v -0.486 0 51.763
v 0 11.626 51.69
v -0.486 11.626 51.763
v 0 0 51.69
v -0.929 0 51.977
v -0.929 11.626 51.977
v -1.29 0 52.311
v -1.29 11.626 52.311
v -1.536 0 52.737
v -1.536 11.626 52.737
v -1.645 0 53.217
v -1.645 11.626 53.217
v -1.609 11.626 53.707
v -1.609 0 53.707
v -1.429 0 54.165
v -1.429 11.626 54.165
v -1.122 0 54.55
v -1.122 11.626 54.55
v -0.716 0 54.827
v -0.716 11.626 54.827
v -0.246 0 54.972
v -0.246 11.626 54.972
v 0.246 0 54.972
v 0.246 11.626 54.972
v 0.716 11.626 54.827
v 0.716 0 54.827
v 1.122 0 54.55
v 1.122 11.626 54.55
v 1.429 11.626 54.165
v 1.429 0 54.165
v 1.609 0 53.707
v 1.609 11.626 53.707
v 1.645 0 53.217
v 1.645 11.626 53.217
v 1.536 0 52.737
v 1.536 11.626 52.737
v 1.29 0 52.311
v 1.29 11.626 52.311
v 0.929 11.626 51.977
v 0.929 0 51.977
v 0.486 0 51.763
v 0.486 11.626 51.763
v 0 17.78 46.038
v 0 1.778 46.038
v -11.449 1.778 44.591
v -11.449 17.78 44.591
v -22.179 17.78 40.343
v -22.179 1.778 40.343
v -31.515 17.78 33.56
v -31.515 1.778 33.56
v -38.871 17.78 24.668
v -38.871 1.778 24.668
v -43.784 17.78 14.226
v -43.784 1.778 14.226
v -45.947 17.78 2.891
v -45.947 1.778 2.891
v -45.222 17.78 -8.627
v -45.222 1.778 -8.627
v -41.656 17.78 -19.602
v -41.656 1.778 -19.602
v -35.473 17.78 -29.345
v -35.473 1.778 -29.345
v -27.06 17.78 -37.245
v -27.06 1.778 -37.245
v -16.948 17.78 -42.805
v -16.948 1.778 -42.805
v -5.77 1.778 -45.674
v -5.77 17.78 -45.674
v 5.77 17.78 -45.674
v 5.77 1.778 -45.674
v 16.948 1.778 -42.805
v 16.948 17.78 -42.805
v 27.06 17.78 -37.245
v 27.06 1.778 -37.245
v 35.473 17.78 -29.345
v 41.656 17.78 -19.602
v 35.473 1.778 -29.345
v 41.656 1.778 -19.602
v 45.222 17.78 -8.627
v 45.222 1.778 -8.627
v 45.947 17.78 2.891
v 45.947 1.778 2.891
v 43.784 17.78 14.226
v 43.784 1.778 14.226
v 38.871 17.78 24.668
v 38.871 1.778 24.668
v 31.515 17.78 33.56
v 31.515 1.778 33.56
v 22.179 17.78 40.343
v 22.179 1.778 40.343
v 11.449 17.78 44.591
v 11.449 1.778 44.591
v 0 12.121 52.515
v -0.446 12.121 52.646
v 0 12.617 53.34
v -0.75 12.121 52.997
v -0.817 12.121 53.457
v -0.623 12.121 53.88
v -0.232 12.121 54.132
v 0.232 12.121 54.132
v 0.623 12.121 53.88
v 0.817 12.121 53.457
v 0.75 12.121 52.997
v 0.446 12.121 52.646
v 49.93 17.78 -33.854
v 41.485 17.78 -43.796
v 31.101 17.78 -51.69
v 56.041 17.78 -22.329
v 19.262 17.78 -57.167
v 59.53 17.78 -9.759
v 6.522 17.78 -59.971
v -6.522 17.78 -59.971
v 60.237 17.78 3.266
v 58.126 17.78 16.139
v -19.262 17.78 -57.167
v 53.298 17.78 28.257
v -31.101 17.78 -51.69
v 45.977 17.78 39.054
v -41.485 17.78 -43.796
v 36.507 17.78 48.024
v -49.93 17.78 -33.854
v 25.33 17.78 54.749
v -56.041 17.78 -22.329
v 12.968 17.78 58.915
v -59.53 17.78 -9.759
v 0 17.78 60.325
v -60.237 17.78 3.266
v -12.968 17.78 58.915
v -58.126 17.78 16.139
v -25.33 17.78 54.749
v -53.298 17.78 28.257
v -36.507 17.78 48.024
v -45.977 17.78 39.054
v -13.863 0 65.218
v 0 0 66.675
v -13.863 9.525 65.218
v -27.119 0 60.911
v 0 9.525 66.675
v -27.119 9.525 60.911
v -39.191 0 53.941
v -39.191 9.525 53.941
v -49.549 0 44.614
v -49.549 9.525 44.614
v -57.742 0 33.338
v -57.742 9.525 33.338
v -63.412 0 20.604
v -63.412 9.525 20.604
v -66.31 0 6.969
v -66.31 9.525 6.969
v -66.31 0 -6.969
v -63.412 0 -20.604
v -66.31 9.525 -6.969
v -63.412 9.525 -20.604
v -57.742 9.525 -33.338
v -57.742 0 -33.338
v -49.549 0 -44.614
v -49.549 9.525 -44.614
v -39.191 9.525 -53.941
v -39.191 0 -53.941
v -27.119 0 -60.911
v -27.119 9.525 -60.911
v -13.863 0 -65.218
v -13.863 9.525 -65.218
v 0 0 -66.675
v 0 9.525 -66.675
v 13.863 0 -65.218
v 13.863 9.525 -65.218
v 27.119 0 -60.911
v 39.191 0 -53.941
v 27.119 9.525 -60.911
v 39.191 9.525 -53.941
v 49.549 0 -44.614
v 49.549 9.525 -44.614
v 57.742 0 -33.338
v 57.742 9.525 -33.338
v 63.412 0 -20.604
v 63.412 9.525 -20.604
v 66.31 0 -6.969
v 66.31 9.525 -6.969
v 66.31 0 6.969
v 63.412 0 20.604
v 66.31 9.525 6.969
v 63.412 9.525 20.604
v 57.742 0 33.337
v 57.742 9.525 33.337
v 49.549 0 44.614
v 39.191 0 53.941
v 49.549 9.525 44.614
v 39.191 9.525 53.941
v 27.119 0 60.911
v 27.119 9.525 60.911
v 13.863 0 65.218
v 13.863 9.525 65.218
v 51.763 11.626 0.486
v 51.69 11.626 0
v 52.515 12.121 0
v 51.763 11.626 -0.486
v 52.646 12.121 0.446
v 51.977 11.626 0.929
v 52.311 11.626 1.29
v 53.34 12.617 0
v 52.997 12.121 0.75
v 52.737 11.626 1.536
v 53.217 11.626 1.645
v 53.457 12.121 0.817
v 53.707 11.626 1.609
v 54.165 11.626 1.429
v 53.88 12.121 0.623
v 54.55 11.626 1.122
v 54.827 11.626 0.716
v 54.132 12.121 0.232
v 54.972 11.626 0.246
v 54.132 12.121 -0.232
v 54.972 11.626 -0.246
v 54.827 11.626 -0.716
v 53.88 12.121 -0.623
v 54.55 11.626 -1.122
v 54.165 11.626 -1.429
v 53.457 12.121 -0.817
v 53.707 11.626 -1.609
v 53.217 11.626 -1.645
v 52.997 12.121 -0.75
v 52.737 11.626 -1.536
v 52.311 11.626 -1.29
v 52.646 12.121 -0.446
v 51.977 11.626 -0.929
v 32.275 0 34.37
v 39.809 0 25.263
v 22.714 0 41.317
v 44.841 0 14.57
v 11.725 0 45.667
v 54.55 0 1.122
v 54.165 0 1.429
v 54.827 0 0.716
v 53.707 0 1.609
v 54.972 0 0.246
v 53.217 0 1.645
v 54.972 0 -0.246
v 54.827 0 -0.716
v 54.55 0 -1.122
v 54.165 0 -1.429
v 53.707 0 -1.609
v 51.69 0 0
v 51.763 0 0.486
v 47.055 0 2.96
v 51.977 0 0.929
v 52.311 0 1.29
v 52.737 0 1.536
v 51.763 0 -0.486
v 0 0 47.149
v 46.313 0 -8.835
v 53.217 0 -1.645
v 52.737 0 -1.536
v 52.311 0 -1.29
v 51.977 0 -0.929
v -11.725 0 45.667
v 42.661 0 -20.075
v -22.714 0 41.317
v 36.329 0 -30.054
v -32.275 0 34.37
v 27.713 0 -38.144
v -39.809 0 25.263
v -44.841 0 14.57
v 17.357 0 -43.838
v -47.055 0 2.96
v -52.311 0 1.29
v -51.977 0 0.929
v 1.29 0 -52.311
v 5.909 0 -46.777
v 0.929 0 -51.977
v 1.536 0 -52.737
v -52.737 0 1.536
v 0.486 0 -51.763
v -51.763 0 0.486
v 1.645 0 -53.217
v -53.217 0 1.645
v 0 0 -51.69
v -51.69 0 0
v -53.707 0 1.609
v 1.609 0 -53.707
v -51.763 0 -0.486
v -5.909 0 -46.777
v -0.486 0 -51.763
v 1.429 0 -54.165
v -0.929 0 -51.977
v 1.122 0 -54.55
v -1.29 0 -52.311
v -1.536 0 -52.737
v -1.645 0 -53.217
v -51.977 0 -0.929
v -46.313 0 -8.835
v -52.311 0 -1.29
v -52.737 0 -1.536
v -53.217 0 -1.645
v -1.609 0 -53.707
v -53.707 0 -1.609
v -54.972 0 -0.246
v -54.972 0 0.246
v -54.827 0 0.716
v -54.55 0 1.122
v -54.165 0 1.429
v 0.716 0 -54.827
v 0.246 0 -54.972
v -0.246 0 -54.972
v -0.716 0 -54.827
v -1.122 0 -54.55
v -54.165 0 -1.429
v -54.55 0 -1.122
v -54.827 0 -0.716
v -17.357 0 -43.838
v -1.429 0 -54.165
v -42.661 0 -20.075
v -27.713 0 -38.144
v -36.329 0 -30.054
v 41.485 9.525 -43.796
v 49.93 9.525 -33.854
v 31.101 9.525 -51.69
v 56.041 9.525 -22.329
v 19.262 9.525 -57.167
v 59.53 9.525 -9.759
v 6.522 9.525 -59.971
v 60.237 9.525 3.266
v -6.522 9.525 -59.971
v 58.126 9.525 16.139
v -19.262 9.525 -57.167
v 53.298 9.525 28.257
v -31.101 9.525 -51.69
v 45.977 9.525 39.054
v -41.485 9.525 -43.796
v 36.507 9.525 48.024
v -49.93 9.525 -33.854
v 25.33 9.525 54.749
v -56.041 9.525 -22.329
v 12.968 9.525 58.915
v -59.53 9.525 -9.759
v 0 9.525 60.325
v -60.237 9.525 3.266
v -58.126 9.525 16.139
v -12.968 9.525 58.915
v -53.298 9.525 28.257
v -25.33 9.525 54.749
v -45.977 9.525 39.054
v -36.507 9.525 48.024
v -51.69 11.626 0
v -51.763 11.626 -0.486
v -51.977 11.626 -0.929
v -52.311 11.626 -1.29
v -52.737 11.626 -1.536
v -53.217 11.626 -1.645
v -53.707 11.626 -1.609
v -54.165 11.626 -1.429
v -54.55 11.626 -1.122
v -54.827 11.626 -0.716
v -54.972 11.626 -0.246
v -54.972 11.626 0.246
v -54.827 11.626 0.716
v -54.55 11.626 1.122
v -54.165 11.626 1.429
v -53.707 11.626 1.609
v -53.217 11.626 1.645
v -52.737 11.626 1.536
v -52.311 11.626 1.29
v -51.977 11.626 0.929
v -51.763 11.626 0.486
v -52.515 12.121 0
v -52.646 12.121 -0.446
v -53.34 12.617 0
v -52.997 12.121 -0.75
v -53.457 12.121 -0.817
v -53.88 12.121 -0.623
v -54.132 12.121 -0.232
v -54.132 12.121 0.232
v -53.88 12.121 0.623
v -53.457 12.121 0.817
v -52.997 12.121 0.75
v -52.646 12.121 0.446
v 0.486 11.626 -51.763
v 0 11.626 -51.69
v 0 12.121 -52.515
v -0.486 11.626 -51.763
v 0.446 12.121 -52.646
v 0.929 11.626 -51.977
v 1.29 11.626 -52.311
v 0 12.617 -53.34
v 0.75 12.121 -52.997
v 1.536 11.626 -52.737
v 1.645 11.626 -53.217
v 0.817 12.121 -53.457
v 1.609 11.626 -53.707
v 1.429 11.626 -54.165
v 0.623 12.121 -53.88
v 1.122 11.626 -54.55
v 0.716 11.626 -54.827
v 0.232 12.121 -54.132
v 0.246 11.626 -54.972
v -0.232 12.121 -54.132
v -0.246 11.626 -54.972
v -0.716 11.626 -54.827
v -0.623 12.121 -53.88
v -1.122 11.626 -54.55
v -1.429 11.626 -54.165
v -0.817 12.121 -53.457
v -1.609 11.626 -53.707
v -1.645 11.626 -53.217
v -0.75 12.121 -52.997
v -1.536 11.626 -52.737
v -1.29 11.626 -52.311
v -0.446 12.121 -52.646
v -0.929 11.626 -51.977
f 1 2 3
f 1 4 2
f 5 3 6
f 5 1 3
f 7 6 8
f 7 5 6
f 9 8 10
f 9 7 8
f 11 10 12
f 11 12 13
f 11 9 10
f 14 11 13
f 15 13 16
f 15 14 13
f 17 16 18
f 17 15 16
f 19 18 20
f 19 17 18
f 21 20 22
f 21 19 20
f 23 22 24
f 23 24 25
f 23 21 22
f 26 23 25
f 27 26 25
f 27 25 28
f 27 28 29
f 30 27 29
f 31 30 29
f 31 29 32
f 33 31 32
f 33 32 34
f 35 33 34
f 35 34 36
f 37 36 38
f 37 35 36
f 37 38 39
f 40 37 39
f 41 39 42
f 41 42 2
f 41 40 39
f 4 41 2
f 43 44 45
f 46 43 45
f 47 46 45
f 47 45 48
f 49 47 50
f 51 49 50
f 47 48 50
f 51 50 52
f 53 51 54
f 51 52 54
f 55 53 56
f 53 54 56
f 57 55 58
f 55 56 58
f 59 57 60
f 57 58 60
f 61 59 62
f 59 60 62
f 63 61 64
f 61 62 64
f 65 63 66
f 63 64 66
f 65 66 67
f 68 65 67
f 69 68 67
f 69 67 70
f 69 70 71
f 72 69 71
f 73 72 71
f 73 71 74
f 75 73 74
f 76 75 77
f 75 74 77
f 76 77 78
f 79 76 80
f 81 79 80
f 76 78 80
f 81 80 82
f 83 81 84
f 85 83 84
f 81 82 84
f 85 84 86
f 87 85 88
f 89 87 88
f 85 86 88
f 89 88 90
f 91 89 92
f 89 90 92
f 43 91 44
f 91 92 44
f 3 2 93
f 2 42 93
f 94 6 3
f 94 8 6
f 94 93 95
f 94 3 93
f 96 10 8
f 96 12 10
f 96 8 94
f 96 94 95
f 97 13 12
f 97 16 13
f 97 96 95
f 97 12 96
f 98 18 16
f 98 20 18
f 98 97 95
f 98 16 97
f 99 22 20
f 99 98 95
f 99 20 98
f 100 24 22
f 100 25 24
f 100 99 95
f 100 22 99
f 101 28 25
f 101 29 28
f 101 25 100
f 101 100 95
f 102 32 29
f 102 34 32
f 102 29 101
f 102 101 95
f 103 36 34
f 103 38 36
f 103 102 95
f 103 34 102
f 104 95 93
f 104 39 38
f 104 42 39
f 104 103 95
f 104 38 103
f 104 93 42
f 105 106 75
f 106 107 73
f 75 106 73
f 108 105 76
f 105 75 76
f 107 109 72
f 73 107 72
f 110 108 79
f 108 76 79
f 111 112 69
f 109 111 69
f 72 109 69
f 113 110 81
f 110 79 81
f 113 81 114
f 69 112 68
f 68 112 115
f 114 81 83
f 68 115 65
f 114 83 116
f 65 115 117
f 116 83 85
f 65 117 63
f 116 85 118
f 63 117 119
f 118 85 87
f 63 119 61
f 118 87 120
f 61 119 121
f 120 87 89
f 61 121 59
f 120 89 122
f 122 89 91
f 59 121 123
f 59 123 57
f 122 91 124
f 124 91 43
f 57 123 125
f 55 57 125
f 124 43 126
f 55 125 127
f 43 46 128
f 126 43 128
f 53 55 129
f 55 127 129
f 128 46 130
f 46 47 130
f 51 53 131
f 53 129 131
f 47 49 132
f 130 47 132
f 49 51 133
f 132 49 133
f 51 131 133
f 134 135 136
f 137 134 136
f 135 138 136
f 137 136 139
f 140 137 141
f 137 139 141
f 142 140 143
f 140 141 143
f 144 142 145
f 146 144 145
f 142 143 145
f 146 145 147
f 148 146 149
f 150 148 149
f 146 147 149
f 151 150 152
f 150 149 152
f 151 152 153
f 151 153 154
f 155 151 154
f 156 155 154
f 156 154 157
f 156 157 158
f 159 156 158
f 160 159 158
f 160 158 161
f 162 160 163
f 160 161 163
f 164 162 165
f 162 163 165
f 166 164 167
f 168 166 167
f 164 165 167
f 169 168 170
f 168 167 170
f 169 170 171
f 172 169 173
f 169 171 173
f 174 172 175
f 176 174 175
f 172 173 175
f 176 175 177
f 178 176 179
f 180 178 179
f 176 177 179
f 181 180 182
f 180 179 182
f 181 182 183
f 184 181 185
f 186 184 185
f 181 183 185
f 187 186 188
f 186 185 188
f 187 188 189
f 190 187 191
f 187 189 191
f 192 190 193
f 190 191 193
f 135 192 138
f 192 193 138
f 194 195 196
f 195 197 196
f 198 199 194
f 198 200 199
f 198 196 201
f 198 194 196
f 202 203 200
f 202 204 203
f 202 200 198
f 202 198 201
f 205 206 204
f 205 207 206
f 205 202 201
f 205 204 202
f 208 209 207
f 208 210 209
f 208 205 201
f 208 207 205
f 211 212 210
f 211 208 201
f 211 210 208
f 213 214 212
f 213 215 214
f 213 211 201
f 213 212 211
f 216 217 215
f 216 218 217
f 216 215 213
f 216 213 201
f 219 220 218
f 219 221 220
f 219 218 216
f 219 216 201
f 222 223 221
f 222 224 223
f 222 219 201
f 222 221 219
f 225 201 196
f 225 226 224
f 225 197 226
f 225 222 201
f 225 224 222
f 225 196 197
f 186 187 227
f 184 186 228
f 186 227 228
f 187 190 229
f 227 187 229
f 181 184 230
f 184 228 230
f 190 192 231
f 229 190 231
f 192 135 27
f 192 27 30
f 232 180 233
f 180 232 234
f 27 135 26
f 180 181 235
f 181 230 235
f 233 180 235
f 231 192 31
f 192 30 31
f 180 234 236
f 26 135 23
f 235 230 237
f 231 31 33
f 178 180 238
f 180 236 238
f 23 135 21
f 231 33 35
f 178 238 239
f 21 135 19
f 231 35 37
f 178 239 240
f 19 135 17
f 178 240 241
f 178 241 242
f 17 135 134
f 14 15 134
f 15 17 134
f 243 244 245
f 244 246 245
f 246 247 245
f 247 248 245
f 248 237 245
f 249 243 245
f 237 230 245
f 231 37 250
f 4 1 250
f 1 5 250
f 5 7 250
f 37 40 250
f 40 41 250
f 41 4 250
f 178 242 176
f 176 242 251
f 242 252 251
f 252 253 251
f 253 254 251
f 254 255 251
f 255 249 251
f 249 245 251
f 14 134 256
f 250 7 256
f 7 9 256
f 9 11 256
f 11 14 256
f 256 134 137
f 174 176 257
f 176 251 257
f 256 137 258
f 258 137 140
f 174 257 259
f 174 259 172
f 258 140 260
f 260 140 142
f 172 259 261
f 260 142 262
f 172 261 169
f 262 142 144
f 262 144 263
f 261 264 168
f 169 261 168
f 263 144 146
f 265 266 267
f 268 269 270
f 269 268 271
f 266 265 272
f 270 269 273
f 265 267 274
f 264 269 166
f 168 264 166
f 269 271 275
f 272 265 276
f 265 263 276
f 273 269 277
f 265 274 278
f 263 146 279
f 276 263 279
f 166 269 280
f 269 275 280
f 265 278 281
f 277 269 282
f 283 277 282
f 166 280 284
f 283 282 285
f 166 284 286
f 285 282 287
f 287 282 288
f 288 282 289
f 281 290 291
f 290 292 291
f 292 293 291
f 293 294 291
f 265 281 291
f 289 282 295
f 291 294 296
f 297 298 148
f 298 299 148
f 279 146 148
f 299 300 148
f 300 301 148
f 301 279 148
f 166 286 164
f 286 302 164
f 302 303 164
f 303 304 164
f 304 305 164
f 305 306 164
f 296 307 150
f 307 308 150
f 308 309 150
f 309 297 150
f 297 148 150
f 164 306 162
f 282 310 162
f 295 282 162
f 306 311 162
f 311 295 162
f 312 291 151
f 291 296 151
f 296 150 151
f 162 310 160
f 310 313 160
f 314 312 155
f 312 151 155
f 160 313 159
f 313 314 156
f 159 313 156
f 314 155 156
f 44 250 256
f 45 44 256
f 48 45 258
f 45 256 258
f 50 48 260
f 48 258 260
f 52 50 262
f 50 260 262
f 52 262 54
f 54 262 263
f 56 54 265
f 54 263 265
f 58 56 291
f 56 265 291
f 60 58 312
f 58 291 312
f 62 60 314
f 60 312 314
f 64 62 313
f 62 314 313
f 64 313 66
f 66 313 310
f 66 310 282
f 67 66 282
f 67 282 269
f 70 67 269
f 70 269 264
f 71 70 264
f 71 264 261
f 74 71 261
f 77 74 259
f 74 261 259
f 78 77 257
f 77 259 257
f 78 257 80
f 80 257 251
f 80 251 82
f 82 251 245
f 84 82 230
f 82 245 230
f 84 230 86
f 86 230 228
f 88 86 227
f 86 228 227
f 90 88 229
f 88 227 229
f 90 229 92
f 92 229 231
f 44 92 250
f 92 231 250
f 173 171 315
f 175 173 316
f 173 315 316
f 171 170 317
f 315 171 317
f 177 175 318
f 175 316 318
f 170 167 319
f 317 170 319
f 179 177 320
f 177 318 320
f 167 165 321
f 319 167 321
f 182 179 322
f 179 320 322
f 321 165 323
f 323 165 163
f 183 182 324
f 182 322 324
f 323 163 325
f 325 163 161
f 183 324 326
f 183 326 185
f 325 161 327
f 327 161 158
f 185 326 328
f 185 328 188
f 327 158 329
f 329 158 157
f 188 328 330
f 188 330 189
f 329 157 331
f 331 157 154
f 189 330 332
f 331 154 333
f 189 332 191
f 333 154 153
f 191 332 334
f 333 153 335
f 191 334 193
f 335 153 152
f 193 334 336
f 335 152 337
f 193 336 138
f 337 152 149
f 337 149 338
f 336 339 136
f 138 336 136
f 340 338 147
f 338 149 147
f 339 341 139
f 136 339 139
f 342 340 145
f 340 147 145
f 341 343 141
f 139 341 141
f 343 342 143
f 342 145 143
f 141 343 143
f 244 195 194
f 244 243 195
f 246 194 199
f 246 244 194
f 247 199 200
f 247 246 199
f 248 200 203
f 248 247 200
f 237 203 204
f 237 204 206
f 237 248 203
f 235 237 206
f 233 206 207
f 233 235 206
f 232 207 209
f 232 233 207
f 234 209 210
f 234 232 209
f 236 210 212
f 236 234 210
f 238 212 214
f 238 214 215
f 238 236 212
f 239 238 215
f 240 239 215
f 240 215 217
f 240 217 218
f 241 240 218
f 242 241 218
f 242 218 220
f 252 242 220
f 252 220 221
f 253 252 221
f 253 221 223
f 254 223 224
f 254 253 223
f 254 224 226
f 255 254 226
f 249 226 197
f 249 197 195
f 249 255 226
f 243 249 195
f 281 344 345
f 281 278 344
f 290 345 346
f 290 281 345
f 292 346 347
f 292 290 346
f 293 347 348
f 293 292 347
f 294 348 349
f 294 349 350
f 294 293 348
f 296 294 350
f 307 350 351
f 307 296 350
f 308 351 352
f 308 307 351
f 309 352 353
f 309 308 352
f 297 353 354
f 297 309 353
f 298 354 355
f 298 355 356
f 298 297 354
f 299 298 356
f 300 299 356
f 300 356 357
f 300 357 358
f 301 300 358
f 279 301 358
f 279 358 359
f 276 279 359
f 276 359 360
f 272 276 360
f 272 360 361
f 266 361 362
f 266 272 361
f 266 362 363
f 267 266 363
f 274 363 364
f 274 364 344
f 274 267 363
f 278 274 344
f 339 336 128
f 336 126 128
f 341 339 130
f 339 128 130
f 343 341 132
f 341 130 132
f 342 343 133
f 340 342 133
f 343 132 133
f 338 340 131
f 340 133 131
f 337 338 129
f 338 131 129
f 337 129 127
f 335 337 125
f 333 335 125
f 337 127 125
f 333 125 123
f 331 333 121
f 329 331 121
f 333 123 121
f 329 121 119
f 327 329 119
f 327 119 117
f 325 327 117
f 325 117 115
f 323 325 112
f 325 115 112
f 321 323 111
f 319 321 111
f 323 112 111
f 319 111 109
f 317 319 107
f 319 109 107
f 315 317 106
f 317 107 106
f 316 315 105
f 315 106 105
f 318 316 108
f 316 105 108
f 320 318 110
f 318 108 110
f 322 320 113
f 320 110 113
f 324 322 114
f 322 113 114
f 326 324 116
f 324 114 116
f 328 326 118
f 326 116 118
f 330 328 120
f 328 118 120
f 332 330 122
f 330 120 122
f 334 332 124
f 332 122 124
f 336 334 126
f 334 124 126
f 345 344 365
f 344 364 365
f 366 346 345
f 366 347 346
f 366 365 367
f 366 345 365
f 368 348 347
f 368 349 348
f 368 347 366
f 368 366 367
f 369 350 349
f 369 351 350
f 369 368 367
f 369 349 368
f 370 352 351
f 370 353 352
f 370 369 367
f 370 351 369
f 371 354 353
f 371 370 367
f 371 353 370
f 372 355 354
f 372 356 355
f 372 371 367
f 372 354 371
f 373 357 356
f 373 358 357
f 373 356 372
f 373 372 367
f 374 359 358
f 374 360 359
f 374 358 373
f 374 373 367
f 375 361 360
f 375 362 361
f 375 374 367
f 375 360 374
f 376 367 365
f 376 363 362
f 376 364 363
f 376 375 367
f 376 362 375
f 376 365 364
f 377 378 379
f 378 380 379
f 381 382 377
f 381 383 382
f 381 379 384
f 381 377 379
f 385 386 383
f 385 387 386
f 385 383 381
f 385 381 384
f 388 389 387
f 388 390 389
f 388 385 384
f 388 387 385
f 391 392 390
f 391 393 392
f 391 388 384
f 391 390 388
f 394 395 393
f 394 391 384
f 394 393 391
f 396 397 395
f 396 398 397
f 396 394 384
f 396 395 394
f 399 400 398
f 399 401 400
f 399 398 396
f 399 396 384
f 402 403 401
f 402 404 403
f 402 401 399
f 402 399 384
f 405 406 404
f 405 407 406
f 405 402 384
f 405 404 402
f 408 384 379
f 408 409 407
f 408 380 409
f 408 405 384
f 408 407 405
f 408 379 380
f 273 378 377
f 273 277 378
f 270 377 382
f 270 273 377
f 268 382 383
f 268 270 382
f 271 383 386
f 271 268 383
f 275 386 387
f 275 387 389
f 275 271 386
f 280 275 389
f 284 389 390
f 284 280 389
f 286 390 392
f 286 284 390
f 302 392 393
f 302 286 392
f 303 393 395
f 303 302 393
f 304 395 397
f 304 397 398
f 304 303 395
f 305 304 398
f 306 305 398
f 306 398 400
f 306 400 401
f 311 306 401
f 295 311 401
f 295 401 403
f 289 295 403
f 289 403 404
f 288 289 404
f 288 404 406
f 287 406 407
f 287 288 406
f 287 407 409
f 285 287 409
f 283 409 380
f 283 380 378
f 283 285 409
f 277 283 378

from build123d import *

# Parameters (mm, degrees)
CHAMFER1_SIZE     = 1.778
CHAMFER1_SIZE2    = 1.111017708
CIRPATTERN1_COUNT = 4


with BuildPart() as part:
    # Sketch2 → Revolve1 (revolve)
    with BuildSketch(Plane.XY, mode=Mode.PRIVATE) as revolve1_sk:
        Polygon((-46.0375, 0), (-66.675, 0), (-66.675, 9.525), (-60.325, 9.525), (-60.325, 17.78), (-46.0375, 17.78), align=None)
    revolve(revolve1_sk.sketch.rotate(Axis((0, 0, 0), (0, -1, 0)), 270), axis=Axis((0, 0, 0), (0, -1, 0)))

    # Chamfer1
    chamfer1_edges = [part.edges().sort_by_distance(p)[0] for p in [
        (0, 0, -46.0375),
    ]]
    chamfer1_side = [part.faces().sort_by_distance(p)[0] for p in [
        (0, 8.89, -46.0375),
    ]]
    chamfer(chamfer1_edges, length=CHAMFER1_SIZE, length2=CHAMFER1_SIZE2, reference=chamfer1_side[0])

    # Sketch5 → M4x0.7 Tapped Hole2 (revolve, cut)
    with BuildSketch(Plane(origin=(0, 0, 53.34), x_dir=(0, 0, -1), z_dir=(1, 0, 0))):
        Polygon((0, 0), (0, 12.617000021), (1.65, 11.62558), (1.65, 0), align=None)
    m4x0_7_tapped_hole2 = revolve(axis=Axis((0, -6.35, 53.34), (0, 1, 0)), mode=Mode.SUBTRACT)

    # CirPattern1: M4x0.7 Tapped Hole2 ×4 about axis
    cirpattern1_axis = Axis((0, 0, 0), (0, 1, 0))
    for i in range(1, CIRPATTERN1_COUNT):
        add(m4x0_7_tapped_hole2.rotate(cirpattern1_axis, i * 360 / CIRPATTERN1_COUNT), mode=Mode.SUBTRACT)


solid = part.part
